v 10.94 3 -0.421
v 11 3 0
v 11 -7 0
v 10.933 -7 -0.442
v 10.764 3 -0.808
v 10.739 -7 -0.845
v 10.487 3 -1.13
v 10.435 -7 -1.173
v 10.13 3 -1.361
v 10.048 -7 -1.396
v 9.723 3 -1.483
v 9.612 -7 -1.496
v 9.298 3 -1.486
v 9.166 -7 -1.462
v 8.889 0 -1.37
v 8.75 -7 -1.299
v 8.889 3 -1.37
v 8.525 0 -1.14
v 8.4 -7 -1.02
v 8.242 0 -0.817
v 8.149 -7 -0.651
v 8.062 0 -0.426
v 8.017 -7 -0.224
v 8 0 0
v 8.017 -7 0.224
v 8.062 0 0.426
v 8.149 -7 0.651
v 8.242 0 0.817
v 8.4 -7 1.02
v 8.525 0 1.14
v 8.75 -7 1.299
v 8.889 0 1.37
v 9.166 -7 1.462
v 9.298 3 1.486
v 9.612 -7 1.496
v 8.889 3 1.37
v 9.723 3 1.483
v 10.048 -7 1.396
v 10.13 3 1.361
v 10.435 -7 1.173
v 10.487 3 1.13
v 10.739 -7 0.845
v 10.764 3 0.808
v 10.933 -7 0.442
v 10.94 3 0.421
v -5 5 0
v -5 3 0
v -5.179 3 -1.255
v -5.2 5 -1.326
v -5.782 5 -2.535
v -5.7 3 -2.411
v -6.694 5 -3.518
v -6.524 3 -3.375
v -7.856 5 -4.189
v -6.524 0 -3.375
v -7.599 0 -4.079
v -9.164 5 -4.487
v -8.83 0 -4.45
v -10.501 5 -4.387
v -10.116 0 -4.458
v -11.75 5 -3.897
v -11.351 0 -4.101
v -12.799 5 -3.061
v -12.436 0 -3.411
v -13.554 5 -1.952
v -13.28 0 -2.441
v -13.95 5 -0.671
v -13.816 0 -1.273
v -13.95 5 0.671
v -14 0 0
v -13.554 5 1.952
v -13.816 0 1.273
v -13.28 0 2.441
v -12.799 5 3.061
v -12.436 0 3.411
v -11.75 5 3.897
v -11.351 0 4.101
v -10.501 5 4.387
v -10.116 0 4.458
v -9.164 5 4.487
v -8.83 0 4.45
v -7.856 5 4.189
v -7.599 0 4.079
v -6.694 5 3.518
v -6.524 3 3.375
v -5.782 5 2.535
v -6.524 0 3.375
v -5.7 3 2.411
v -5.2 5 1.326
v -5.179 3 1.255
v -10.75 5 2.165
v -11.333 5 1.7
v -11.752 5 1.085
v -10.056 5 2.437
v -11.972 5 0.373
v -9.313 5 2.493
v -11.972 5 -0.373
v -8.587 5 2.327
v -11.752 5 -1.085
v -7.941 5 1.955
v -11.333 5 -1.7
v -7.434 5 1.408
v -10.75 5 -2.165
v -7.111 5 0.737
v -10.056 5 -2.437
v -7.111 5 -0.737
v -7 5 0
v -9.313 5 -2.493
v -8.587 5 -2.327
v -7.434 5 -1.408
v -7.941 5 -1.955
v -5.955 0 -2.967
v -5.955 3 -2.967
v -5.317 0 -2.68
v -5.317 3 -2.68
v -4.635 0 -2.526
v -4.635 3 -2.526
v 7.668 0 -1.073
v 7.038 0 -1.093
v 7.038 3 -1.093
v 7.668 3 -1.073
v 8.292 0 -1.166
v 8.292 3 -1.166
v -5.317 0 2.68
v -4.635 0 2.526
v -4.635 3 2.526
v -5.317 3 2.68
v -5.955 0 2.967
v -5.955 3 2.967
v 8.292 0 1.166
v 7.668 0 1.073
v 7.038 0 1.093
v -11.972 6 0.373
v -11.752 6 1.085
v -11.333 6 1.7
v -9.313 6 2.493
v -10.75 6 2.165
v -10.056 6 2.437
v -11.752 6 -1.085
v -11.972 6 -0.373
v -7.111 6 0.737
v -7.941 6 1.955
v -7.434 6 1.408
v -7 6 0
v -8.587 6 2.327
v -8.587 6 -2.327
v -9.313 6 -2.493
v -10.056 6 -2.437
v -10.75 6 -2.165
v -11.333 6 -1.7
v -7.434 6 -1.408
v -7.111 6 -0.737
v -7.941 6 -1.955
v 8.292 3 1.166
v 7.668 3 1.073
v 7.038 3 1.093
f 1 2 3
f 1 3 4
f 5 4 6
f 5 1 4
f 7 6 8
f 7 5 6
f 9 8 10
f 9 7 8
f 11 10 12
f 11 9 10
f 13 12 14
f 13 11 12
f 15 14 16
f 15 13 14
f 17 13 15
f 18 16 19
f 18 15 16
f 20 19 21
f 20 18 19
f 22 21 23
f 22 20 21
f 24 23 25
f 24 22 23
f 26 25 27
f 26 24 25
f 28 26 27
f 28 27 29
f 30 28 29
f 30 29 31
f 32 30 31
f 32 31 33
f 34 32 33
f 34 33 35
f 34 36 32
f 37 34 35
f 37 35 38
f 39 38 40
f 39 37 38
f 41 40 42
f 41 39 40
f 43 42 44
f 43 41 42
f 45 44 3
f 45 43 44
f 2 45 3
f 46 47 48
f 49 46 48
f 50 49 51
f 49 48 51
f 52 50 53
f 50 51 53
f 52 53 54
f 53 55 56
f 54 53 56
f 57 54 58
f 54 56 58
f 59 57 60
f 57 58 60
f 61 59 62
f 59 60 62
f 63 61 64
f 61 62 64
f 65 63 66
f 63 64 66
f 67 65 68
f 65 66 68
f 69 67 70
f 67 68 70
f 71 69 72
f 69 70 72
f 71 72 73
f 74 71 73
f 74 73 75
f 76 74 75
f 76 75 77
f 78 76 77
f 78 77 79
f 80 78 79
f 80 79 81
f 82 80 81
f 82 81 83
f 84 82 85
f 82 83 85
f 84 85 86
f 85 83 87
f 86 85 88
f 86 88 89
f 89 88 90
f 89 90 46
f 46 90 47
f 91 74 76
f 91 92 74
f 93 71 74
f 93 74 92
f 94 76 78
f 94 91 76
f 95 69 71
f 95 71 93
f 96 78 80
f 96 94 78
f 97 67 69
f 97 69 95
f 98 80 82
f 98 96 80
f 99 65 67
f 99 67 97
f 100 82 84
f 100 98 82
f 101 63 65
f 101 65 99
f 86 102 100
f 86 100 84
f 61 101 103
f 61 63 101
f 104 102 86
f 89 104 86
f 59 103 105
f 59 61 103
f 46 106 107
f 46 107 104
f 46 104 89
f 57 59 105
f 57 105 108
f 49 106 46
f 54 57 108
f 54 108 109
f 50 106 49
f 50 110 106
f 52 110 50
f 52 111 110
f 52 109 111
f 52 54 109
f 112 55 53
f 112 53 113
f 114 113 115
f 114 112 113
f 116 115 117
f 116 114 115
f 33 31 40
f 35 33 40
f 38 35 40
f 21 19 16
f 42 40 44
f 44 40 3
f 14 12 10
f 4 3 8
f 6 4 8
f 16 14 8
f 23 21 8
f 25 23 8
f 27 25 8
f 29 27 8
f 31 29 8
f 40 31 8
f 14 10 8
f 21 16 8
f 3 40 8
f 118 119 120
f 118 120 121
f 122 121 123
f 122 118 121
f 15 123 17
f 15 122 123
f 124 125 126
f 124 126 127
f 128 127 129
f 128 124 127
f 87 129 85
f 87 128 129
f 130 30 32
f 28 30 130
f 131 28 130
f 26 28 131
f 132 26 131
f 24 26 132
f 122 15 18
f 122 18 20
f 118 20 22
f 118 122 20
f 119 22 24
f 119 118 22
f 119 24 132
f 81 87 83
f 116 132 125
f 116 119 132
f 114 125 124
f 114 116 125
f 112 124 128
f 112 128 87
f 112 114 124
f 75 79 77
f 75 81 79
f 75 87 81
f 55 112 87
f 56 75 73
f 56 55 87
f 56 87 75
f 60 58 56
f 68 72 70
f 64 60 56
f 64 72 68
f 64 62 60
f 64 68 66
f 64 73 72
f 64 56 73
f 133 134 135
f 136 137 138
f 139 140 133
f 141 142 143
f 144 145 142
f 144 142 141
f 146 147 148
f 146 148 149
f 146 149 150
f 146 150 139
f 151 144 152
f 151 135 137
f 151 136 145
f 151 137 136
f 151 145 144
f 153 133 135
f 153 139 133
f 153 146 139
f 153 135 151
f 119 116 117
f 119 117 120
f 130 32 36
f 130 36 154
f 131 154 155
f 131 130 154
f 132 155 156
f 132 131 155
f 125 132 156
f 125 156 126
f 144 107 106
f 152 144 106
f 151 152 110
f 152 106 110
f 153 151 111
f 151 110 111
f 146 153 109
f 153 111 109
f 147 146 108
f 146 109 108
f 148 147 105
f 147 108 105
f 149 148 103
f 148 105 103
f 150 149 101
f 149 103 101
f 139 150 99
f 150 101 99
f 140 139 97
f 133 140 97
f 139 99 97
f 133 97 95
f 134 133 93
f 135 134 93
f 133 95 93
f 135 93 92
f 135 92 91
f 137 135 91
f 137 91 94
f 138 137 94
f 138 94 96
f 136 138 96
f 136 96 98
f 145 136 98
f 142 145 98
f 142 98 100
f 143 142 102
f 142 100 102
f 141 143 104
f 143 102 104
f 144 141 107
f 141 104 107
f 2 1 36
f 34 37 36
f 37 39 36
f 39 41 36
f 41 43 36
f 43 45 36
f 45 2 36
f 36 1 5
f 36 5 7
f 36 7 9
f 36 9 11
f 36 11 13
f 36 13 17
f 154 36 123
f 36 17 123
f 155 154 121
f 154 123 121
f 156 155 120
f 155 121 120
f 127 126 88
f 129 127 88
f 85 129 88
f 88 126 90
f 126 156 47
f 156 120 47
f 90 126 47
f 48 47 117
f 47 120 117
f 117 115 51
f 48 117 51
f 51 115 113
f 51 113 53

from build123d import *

# Parameters (mm, degrees)
SKETCH1_R                = 4.5
BOSS_EXTRUDE1_DEPTH      = 5
BOSS_EXTRUDE2_DEPTH      = 3
BOSS_EXTRUDE2_DEPTH_BACK = 7
SKETCH1_3_R              = 1.5
BOSS_EXTRUDE3_DEPTH      = 3
SKETCH3_R                = 2.5
BOSS_EXTRUDE4_DEPTH      = 1


with BuildPart() as part:
    # Sketch1 → Boss-Extrude1 (new body)
    with BuildSketch(Plane(origin=(0, 0, 0), x_dir=(1, 0, 0), z_dir=(0, 1, 0))):
        with Locations((-9.5, 0)):
            Circle(SKETCH1_R)
    extrude(amount=BOSS_EXTRUDE1_DEPTH)



with BuildPart() as body_2:
    # Sketch1<3> → Boss-Extrude2 (new, two sides: drawn at the far end of the back side and taken through both)
    with BuildSketch(Plane(origin=(0, 0, 0), x_dir=(1, 0, 0), z_dir=(0, 1, 0)).offset(-BOSS_EXTRUDE2_DEPTH_BACK)):
        with Locations((9.5, 0)):
            Circle(SKETCH1_3_R)
    extrude(amount=BOSS_EXTRUDE2_DEPTH + BOSS_EXTRUDE2_DEPTH_BACK)


with BuildPart() as part_1:
    add(part.part)

    add(body_2.part)  # Boss-Extrude3 merges body 2
    # Sketch2 → Boss-Extrude3 (add)
    with BuildSketch(Plane(origin=(0, 0, 0), x_dir=(1, 0, 0), z_dir=(0, 1, 0))):
        with BuildLine():
            Line((-4.63504008, 2.526088469), (7.037637478, 1.092863881))
            ThreePointArc((7.037637478, 1.092863881), (7.982322779, 1.105340991), (8.889254054, 1.370032623))
            ThreePointArc((8.889254054, 1.370032623), (8, 0), (8.889254054, -1.370032623))
            ThreePointArc((8.889254054, -1.370032623), (7.982322779, -1.105340991), (7.037637478, -1.092863881))
            Line((7.037637478, -1.092863881), (-4.63504008, -2.526088469))
            ThreePointArc((-4.63504008, -2.526088469), (-5.643496055, -2.807700077), (-6.523529775, -3.375))
            ThreePointArc((-6.523529775, -3.375), (-5, 0), (-6.523529775, 3.375))
            ThreePointArc((-6.523529775, 3.375), (-5.643496055, 2.807700077), (-4.63504008, 2.526088469))
        make_face()
    extrude(amount=BOSS_EXTRUDE3_DEPTH)

    # Sketch3 → Boss-Extrude4 (add)
    with BuildSketch(Plane(origin=(0, 5, 0), x_dir=(1, 0, 0), z_dir=(0, 1, 0))):
        with Locations((-9.5, 0)):
            Circle(SKETCH3_R)
    extrude(amount=BOSS_EXTRUDE4_DEPTH)


solid = part_1.part
